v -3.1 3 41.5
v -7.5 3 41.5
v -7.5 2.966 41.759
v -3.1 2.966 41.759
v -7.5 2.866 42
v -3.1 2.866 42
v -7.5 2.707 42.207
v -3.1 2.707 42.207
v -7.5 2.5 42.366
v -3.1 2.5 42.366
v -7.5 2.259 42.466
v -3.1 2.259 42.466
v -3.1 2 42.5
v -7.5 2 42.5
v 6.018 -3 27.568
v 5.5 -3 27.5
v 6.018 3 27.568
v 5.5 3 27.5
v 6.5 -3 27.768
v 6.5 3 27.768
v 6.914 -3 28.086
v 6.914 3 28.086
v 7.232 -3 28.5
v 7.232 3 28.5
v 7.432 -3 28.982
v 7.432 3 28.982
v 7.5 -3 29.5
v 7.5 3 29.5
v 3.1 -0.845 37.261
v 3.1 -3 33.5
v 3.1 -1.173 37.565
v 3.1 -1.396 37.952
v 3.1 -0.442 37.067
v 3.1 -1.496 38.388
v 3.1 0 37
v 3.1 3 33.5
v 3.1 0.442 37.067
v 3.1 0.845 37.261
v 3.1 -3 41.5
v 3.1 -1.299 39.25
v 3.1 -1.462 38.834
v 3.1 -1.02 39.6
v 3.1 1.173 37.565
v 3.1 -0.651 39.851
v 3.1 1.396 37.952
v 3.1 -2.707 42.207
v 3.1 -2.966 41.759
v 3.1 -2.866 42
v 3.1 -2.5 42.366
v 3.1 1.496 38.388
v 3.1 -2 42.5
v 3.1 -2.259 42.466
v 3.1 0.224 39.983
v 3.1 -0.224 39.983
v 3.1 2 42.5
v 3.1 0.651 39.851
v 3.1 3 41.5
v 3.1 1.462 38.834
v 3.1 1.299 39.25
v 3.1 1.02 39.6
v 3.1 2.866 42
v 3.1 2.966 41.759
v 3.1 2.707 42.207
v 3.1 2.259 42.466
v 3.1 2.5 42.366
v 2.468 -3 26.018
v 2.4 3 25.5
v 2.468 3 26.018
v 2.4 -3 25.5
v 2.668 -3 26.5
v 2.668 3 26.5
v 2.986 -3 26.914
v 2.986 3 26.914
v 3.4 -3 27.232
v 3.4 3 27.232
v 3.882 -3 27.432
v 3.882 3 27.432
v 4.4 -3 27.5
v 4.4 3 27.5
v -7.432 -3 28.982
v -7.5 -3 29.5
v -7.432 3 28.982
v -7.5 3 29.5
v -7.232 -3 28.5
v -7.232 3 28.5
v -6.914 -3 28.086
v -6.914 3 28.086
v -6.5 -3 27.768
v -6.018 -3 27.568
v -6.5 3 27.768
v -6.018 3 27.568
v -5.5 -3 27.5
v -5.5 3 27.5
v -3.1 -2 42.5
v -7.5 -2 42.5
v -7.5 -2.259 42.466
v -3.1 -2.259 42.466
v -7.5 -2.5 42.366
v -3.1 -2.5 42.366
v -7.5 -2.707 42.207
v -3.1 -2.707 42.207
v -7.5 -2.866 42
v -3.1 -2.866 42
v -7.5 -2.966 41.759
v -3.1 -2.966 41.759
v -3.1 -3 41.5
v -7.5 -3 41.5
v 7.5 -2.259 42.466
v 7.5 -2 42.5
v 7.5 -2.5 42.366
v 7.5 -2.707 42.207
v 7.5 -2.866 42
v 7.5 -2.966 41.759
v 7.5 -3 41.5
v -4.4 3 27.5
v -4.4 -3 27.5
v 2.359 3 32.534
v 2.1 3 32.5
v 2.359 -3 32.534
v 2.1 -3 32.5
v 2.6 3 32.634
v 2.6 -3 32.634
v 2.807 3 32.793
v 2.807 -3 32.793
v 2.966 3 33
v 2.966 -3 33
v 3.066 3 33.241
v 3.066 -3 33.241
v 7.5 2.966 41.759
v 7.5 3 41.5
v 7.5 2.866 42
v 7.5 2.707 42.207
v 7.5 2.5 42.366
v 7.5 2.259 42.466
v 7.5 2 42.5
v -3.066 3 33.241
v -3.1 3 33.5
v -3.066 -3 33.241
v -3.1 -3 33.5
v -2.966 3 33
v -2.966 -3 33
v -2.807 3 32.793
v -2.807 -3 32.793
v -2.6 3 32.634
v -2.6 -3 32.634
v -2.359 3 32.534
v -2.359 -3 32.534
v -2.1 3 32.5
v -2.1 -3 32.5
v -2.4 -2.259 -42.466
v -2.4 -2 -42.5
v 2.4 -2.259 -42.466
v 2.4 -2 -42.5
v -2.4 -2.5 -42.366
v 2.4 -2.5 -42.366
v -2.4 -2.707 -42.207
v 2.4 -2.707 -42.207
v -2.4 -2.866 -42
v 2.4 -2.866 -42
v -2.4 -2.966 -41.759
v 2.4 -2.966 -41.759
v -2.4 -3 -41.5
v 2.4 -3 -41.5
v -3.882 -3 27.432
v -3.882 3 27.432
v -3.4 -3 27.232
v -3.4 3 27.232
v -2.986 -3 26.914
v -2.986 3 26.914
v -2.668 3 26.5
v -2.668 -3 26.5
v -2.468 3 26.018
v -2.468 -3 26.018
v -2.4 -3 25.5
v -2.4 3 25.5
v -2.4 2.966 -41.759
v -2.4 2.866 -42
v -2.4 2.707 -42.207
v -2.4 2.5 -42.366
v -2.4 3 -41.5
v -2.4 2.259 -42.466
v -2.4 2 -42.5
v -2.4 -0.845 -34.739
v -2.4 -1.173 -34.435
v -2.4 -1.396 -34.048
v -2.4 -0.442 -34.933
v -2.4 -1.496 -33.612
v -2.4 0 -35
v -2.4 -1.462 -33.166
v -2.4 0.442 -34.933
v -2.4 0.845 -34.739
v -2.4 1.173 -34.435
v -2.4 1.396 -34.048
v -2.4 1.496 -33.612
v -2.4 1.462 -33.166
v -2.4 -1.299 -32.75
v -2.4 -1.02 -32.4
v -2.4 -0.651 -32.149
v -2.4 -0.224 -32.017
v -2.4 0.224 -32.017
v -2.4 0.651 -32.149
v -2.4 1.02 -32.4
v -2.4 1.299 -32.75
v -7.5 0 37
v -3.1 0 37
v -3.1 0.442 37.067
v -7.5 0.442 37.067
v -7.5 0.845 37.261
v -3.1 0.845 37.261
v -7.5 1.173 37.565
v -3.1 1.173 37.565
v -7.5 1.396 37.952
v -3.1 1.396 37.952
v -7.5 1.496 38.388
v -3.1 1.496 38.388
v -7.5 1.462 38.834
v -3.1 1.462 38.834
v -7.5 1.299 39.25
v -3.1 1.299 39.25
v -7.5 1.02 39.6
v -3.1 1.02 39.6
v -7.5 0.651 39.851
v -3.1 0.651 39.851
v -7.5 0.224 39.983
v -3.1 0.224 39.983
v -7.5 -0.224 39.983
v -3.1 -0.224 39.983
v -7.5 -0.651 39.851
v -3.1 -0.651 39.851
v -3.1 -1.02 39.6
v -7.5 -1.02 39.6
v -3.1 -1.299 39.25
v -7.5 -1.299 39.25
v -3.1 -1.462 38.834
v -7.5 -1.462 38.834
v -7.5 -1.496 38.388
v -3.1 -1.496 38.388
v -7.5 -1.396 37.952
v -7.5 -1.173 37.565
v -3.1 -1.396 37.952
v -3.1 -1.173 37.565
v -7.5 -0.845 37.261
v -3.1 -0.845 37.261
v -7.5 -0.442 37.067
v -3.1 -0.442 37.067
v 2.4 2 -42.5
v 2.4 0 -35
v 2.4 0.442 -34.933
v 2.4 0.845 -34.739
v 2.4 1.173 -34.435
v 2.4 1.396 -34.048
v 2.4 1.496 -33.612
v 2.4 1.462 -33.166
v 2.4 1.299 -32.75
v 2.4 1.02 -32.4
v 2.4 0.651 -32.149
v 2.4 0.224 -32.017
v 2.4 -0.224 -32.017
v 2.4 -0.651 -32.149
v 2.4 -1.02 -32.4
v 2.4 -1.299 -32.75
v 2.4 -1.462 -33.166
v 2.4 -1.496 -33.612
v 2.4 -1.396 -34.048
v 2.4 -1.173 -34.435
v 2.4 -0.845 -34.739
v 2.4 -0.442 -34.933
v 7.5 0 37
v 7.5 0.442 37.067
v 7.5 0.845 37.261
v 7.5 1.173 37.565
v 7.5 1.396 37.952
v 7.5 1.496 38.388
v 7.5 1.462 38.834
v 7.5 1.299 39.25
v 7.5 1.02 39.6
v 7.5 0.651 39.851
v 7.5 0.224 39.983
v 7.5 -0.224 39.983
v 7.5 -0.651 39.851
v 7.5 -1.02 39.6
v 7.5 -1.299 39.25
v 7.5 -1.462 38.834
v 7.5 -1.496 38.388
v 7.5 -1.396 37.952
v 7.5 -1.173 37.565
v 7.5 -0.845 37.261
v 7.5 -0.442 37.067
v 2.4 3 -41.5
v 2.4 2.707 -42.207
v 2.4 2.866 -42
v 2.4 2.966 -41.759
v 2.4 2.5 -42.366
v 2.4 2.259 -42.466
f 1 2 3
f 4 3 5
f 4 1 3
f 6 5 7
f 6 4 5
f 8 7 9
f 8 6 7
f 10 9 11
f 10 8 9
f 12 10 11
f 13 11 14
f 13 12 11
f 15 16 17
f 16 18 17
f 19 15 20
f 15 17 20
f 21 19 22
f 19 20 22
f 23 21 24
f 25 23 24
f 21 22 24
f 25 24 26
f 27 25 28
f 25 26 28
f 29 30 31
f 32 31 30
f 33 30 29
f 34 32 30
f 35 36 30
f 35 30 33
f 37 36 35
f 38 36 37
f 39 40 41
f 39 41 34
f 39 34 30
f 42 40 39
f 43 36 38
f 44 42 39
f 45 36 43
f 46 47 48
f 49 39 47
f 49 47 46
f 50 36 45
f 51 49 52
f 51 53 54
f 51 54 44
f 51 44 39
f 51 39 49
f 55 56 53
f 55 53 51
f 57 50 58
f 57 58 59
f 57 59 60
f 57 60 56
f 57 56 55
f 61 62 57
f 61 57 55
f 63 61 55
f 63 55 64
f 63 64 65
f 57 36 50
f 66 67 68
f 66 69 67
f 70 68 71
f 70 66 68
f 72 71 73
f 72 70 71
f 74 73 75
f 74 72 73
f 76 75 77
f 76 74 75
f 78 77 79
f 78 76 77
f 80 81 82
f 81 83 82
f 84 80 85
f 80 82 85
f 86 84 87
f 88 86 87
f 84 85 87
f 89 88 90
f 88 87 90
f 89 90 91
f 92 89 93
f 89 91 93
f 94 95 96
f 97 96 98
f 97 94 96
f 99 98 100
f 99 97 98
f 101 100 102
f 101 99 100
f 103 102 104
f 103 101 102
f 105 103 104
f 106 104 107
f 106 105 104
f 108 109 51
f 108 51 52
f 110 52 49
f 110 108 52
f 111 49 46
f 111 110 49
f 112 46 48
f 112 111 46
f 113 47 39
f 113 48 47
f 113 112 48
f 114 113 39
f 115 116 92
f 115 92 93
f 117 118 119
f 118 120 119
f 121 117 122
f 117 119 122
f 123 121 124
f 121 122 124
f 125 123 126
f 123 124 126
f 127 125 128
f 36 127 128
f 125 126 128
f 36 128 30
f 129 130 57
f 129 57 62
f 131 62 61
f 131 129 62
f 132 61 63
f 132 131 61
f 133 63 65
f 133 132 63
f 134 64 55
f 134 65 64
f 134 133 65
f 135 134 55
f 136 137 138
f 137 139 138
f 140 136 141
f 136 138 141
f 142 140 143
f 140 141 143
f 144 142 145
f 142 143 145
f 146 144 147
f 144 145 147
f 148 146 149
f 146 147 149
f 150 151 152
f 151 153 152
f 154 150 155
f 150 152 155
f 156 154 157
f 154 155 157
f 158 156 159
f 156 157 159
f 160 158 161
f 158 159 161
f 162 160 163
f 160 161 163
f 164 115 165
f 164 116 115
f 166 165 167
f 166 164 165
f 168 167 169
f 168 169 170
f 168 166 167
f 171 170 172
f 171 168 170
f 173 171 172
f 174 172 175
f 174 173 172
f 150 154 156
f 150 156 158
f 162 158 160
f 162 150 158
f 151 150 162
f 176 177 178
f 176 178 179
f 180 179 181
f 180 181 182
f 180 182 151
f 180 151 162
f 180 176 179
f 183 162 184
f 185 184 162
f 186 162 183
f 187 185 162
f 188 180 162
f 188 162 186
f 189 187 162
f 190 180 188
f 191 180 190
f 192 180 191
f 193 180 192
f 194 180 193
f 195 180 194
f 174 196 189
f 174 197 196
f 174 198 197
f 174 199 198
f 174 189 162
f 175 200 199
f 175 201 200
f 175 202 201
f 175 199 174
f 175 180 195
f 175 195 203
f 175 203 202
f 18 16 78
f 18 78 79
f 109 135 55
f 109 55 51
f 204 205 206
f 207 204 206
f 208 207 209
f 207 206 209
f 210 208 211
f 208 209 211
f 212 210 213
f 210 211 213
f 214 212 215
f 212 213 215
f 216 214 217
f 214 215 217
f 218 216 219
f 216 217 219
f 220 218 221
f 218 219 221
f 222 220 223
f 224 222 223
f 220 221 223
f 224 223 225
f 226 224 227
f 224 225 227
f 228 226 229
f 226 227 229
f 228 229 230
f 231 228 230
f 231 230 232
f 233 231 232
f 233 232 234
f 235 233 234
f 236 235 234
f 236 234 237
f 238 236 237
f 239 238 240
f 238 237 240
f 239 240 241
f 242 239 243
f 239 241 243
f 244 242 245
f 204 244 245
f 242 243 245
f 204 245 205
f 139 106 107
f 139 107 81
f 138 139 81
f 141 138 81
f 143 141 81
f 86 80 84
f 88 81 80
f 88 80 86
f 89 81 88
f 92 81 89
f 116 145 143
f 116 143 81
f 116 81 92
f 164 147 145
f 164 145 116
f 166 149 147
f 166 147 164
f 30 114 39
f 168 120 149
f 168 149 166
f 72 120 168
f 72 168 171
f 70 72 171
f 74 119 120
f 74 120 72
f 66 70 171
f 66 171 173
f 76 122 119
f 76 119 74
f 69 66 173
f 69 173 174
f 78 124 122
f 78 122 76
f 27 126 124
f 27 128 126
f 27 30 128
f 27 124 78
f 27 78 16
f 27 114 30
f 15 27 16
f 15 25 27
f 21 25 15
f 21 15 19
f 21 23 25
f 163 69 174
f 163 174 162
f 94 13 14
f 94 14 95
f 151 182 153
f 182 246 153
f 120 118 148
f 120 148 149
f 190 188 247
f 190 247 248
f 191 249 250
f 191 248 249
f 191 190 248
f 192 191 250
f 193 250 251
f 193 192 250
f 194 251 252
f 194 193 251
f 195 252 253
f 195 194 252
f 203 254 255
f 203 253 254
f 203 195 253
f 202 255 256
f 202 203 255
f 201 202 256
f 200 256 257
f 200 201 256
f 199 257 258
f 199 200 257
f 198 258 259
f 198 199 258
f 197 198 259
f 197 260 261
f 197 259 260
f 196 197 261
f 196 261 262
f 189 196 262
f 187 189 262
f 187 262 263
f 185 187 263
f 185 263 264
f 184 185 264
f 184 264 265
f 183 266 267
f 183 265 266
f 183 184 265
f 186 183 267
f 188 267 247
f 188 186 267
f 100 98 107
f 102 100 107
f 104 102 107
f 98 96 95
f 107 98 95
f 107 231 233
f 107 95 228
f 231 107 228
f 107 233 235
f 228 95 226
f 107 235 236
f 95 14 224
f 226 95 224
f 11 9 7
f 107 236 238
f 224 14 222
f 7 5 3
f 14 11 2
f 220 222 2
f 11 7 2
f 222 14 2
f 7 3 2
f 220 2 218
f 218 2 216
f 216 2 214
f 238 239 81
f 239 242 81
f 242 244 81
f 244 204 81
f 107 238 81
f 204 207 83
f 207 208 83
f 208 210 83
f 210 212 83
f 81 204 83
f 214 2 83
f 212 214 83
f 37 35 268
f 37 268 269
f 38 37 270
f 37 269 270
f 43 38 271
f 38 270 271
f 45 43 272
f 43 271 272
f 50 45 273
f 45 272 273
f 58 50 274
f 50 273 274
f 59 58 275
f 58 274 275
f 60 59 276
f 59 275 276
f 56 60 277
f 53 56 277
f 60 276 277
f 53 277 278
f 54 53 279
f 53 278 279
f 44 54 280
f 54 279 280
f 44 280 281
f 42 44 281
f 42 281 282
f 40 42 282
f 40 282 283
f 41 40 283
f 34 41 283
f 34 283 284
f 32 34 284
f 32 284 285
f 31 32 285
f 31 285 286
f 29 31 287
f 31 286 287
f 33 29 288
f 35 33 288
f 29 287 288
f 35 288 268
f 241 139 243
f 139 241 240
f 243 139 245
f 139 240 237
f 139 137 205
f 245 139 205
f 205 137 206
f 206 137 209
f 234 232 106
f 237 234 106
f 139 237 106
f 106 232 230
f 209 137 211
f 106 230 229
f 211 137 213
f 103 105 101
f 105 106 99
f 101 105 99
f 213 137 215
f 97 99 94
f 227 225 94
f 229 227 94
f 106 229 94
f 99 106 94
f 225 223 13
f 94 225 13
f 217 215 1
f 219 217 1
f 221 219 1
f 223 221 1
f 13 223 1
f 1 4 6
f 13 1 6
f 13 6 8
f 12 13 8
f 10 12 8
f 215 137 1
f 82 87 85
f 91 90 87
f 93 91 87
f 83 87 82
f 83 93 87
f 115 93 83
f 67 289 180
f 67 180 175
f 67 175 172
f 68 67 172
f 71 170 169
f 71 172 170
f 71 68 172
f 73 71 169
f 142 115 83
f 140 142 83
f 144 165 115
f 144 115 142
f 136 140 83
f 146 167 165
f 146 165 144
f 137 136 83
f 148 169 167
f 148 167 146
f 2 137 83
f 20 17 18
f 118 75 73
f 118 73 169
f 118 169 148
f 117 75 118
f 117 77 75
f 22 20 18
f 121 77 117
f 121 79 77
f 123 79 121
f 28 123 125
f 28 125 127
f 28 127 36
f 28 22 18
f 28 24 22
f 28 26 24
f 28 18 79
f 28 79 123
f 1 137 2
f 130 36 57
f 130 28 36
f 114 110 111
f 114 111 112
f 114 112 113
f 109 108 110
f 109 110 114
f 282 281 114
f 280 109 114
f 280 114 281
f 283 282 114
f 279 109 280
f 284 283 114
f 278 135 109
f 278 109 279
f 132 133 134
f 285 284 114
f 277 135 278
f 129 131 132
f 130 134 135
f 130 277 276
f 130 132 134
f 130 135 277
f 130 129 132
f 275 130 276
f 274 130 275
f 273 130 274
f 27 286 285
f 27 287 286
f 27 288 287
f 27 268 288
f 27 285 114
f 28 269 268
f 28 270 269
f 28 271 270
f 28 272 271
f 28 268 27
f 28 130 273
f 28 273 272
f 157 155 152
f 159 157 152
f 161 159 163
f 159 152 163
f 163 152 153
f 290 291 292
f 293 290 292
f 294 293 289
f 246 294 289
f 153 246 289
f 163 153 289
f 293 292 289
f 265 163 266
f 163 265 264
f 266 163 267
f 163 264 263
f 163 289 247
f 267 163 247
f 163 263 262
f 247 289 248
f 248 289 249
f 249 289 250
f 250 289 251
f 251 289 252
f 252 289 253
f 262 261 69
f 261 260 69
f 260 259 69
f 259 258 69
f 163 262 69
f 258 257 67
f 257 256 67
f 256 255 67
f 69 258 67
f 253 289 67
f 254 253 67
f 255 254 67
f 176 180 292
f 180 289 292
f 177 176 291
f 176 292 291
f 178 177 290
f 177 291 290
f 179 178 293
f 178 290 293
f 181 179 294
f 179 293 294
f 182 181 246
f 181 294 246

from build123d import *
from build123d.topology import SkipClean

# Parameters (mm, degrees)
SALIENTE_EXTRUIR1_DEPTH    = 2.4
CORTAR_EXTRUIR1_DEPTH      = 43.673293756
CORTAR_EXTRUIR1_DEPTH_BACK = 43.673293756
CROQUIS2_R                 = 1.5
CROQUIS3_R                 = 1.5
SALIENTE_EXTRUIR2_DEPTH    = 7.5
CORTAR_EXTRUIR2_DEPTH      = 3.1
REDONDEO1_R                = 2
REDONDEO2_R                = 1


with BuildPart() as part:
    # Croquis1 → Saliente-Extruir1 (new, symmetric)
    with BuildSketch(Plane(origin=(0, 0, 0), x_dir=(0, 0, -1), z_dir=(1, 0, 0))):
        with BuildLine():
            Line((-41.5, 3), (41.5, 3))
            ThreePointArc((41.5, 3), (42.207106781, 2.707106781), (42.5, 2))
            Line((42.5, 2), (42.5, -2))
            ThreePointArc((42.5, -2), (42.207106781, -2.707106781), (41.5, -3))
            Line((41.5, -3), (-41.5, -3))
            ThreePointArc((-41.5, -3), (-42.207106781, -2.707106781), (-42.5, -2))
            Line((-42.5, -2), (-42.5, 2))
            ThreePointArc((-42.5, 2), (-42.207106781, 2.707106781), (-41.5, 3))
        make_face()
    extrude(amount=SALIENTE_EXTRUIR1_DEPTH, both=True)

    # Croquis2 → Cortar-Extruir1 (cut, two sides: drawn at the far end of the back side and taken through both)
    with BuildSketch(Plane(origin=(0, 0, 0), x_dir=(0, 0, -1), z_dir=(1, 0, 0)).offset(-CORTAR_EXTRUIR1_DEPTH_BACK)):
        with Locations((-38.5, 0)):
            Circle(CROQUIS2_R)
        with Locations((33.5, 0)):
            Circle(CROQUIS2_R)
    extrude(amount=CORTAR_EXTRUIR1_DEPTH + CORTAR_EXTRUIR1_DEPTH_BACK, mode=Mode.SUBTRACT)

    # Croquis3 → Saliente-Extruir2 (add, symmetric)
    with SkipClean():  # the faces are left unmerged after this step: merging them gives an invalid solid
        with BuildSketch(Plane(origin=(0, 0, 0), x_dir=(0, 0, -1), z_dir=(1, 0, 0))):
            with BuildLine():
                Line((-42.5, 2), (-42.5, -2))
                ThreePointArc((-42.5, -2), (-42.207106781, -2.707106781), (-41.5, -3))
                Line((-41.5, -3), (-27.5, -3))
                Line((-27.5, -3), (-27.5, 3))
                Line((-27.5, 3), (-41.5, 3))
                ThreePointArc((-41.5, 3), (-42.207106781, 2.707106781), (-42.5, 2))
            make_face()
            with Locations((-38.5, 0)):
                Circle(CROQUIS3_R, mode=Mode.SUBTRACT)
        extrude(amount=SALIENTE_EXTRUIR2_DEPTH, both=True)
    add(part.part.scale(1), mode=Mode.REPLACE)  # the faces are merged on a copy

    # Croquis4 → Cortar-Extruir2 (cut, symmetric)
    with BuildSketch(Plane(origin=(0, 0, 0), x_dir=(0, 0, -1), z_dir=(1, 0, 0))):
        with BuildLine():
            Line((-41.5, 3), (-32.5, 3))
            Line((-32.5, 3), (-32.5, -3))
            Line((-32.5, -3), (-41.5, -3))
            ThreePointArc((-41.5, -3), (-42.207106781, -2.707106781), (-42.5, -2))
            Line((-42.5, -2), (-42.5, 2))
            ThreePointArc((-42.5, 2), (-42.207106781, 2.707106781), (-41.5, 3))
        make_face()
    extrude(amount=CORTAR_EXTRUIR2_DEPTH, both=True, mode=Mode.SUBTRACT)

    # Redondeo1
    redondeo1_edges = [part.edges().sort_by_distance(p)[0] for p in [
        (-2.4, 0, 27.5),
        (2.4, 0, 27.5),
        (-7.5, 0, 27.5),
        (7.5, 0, 27.5),
    ]]
    fillet(redondeo1_edges, radius=REDONDEO1_R)

    # Redondeo2
    redondeo2_edges = [part.edges().sort_by_distance(p)[0] for p in [
        (3.1, 0, 32.5),
        (-3.1, 0, 32.5),
    ]]
    fillet(redondeo2_edges, radius=REDONDEO2_R)


solid = part.part
